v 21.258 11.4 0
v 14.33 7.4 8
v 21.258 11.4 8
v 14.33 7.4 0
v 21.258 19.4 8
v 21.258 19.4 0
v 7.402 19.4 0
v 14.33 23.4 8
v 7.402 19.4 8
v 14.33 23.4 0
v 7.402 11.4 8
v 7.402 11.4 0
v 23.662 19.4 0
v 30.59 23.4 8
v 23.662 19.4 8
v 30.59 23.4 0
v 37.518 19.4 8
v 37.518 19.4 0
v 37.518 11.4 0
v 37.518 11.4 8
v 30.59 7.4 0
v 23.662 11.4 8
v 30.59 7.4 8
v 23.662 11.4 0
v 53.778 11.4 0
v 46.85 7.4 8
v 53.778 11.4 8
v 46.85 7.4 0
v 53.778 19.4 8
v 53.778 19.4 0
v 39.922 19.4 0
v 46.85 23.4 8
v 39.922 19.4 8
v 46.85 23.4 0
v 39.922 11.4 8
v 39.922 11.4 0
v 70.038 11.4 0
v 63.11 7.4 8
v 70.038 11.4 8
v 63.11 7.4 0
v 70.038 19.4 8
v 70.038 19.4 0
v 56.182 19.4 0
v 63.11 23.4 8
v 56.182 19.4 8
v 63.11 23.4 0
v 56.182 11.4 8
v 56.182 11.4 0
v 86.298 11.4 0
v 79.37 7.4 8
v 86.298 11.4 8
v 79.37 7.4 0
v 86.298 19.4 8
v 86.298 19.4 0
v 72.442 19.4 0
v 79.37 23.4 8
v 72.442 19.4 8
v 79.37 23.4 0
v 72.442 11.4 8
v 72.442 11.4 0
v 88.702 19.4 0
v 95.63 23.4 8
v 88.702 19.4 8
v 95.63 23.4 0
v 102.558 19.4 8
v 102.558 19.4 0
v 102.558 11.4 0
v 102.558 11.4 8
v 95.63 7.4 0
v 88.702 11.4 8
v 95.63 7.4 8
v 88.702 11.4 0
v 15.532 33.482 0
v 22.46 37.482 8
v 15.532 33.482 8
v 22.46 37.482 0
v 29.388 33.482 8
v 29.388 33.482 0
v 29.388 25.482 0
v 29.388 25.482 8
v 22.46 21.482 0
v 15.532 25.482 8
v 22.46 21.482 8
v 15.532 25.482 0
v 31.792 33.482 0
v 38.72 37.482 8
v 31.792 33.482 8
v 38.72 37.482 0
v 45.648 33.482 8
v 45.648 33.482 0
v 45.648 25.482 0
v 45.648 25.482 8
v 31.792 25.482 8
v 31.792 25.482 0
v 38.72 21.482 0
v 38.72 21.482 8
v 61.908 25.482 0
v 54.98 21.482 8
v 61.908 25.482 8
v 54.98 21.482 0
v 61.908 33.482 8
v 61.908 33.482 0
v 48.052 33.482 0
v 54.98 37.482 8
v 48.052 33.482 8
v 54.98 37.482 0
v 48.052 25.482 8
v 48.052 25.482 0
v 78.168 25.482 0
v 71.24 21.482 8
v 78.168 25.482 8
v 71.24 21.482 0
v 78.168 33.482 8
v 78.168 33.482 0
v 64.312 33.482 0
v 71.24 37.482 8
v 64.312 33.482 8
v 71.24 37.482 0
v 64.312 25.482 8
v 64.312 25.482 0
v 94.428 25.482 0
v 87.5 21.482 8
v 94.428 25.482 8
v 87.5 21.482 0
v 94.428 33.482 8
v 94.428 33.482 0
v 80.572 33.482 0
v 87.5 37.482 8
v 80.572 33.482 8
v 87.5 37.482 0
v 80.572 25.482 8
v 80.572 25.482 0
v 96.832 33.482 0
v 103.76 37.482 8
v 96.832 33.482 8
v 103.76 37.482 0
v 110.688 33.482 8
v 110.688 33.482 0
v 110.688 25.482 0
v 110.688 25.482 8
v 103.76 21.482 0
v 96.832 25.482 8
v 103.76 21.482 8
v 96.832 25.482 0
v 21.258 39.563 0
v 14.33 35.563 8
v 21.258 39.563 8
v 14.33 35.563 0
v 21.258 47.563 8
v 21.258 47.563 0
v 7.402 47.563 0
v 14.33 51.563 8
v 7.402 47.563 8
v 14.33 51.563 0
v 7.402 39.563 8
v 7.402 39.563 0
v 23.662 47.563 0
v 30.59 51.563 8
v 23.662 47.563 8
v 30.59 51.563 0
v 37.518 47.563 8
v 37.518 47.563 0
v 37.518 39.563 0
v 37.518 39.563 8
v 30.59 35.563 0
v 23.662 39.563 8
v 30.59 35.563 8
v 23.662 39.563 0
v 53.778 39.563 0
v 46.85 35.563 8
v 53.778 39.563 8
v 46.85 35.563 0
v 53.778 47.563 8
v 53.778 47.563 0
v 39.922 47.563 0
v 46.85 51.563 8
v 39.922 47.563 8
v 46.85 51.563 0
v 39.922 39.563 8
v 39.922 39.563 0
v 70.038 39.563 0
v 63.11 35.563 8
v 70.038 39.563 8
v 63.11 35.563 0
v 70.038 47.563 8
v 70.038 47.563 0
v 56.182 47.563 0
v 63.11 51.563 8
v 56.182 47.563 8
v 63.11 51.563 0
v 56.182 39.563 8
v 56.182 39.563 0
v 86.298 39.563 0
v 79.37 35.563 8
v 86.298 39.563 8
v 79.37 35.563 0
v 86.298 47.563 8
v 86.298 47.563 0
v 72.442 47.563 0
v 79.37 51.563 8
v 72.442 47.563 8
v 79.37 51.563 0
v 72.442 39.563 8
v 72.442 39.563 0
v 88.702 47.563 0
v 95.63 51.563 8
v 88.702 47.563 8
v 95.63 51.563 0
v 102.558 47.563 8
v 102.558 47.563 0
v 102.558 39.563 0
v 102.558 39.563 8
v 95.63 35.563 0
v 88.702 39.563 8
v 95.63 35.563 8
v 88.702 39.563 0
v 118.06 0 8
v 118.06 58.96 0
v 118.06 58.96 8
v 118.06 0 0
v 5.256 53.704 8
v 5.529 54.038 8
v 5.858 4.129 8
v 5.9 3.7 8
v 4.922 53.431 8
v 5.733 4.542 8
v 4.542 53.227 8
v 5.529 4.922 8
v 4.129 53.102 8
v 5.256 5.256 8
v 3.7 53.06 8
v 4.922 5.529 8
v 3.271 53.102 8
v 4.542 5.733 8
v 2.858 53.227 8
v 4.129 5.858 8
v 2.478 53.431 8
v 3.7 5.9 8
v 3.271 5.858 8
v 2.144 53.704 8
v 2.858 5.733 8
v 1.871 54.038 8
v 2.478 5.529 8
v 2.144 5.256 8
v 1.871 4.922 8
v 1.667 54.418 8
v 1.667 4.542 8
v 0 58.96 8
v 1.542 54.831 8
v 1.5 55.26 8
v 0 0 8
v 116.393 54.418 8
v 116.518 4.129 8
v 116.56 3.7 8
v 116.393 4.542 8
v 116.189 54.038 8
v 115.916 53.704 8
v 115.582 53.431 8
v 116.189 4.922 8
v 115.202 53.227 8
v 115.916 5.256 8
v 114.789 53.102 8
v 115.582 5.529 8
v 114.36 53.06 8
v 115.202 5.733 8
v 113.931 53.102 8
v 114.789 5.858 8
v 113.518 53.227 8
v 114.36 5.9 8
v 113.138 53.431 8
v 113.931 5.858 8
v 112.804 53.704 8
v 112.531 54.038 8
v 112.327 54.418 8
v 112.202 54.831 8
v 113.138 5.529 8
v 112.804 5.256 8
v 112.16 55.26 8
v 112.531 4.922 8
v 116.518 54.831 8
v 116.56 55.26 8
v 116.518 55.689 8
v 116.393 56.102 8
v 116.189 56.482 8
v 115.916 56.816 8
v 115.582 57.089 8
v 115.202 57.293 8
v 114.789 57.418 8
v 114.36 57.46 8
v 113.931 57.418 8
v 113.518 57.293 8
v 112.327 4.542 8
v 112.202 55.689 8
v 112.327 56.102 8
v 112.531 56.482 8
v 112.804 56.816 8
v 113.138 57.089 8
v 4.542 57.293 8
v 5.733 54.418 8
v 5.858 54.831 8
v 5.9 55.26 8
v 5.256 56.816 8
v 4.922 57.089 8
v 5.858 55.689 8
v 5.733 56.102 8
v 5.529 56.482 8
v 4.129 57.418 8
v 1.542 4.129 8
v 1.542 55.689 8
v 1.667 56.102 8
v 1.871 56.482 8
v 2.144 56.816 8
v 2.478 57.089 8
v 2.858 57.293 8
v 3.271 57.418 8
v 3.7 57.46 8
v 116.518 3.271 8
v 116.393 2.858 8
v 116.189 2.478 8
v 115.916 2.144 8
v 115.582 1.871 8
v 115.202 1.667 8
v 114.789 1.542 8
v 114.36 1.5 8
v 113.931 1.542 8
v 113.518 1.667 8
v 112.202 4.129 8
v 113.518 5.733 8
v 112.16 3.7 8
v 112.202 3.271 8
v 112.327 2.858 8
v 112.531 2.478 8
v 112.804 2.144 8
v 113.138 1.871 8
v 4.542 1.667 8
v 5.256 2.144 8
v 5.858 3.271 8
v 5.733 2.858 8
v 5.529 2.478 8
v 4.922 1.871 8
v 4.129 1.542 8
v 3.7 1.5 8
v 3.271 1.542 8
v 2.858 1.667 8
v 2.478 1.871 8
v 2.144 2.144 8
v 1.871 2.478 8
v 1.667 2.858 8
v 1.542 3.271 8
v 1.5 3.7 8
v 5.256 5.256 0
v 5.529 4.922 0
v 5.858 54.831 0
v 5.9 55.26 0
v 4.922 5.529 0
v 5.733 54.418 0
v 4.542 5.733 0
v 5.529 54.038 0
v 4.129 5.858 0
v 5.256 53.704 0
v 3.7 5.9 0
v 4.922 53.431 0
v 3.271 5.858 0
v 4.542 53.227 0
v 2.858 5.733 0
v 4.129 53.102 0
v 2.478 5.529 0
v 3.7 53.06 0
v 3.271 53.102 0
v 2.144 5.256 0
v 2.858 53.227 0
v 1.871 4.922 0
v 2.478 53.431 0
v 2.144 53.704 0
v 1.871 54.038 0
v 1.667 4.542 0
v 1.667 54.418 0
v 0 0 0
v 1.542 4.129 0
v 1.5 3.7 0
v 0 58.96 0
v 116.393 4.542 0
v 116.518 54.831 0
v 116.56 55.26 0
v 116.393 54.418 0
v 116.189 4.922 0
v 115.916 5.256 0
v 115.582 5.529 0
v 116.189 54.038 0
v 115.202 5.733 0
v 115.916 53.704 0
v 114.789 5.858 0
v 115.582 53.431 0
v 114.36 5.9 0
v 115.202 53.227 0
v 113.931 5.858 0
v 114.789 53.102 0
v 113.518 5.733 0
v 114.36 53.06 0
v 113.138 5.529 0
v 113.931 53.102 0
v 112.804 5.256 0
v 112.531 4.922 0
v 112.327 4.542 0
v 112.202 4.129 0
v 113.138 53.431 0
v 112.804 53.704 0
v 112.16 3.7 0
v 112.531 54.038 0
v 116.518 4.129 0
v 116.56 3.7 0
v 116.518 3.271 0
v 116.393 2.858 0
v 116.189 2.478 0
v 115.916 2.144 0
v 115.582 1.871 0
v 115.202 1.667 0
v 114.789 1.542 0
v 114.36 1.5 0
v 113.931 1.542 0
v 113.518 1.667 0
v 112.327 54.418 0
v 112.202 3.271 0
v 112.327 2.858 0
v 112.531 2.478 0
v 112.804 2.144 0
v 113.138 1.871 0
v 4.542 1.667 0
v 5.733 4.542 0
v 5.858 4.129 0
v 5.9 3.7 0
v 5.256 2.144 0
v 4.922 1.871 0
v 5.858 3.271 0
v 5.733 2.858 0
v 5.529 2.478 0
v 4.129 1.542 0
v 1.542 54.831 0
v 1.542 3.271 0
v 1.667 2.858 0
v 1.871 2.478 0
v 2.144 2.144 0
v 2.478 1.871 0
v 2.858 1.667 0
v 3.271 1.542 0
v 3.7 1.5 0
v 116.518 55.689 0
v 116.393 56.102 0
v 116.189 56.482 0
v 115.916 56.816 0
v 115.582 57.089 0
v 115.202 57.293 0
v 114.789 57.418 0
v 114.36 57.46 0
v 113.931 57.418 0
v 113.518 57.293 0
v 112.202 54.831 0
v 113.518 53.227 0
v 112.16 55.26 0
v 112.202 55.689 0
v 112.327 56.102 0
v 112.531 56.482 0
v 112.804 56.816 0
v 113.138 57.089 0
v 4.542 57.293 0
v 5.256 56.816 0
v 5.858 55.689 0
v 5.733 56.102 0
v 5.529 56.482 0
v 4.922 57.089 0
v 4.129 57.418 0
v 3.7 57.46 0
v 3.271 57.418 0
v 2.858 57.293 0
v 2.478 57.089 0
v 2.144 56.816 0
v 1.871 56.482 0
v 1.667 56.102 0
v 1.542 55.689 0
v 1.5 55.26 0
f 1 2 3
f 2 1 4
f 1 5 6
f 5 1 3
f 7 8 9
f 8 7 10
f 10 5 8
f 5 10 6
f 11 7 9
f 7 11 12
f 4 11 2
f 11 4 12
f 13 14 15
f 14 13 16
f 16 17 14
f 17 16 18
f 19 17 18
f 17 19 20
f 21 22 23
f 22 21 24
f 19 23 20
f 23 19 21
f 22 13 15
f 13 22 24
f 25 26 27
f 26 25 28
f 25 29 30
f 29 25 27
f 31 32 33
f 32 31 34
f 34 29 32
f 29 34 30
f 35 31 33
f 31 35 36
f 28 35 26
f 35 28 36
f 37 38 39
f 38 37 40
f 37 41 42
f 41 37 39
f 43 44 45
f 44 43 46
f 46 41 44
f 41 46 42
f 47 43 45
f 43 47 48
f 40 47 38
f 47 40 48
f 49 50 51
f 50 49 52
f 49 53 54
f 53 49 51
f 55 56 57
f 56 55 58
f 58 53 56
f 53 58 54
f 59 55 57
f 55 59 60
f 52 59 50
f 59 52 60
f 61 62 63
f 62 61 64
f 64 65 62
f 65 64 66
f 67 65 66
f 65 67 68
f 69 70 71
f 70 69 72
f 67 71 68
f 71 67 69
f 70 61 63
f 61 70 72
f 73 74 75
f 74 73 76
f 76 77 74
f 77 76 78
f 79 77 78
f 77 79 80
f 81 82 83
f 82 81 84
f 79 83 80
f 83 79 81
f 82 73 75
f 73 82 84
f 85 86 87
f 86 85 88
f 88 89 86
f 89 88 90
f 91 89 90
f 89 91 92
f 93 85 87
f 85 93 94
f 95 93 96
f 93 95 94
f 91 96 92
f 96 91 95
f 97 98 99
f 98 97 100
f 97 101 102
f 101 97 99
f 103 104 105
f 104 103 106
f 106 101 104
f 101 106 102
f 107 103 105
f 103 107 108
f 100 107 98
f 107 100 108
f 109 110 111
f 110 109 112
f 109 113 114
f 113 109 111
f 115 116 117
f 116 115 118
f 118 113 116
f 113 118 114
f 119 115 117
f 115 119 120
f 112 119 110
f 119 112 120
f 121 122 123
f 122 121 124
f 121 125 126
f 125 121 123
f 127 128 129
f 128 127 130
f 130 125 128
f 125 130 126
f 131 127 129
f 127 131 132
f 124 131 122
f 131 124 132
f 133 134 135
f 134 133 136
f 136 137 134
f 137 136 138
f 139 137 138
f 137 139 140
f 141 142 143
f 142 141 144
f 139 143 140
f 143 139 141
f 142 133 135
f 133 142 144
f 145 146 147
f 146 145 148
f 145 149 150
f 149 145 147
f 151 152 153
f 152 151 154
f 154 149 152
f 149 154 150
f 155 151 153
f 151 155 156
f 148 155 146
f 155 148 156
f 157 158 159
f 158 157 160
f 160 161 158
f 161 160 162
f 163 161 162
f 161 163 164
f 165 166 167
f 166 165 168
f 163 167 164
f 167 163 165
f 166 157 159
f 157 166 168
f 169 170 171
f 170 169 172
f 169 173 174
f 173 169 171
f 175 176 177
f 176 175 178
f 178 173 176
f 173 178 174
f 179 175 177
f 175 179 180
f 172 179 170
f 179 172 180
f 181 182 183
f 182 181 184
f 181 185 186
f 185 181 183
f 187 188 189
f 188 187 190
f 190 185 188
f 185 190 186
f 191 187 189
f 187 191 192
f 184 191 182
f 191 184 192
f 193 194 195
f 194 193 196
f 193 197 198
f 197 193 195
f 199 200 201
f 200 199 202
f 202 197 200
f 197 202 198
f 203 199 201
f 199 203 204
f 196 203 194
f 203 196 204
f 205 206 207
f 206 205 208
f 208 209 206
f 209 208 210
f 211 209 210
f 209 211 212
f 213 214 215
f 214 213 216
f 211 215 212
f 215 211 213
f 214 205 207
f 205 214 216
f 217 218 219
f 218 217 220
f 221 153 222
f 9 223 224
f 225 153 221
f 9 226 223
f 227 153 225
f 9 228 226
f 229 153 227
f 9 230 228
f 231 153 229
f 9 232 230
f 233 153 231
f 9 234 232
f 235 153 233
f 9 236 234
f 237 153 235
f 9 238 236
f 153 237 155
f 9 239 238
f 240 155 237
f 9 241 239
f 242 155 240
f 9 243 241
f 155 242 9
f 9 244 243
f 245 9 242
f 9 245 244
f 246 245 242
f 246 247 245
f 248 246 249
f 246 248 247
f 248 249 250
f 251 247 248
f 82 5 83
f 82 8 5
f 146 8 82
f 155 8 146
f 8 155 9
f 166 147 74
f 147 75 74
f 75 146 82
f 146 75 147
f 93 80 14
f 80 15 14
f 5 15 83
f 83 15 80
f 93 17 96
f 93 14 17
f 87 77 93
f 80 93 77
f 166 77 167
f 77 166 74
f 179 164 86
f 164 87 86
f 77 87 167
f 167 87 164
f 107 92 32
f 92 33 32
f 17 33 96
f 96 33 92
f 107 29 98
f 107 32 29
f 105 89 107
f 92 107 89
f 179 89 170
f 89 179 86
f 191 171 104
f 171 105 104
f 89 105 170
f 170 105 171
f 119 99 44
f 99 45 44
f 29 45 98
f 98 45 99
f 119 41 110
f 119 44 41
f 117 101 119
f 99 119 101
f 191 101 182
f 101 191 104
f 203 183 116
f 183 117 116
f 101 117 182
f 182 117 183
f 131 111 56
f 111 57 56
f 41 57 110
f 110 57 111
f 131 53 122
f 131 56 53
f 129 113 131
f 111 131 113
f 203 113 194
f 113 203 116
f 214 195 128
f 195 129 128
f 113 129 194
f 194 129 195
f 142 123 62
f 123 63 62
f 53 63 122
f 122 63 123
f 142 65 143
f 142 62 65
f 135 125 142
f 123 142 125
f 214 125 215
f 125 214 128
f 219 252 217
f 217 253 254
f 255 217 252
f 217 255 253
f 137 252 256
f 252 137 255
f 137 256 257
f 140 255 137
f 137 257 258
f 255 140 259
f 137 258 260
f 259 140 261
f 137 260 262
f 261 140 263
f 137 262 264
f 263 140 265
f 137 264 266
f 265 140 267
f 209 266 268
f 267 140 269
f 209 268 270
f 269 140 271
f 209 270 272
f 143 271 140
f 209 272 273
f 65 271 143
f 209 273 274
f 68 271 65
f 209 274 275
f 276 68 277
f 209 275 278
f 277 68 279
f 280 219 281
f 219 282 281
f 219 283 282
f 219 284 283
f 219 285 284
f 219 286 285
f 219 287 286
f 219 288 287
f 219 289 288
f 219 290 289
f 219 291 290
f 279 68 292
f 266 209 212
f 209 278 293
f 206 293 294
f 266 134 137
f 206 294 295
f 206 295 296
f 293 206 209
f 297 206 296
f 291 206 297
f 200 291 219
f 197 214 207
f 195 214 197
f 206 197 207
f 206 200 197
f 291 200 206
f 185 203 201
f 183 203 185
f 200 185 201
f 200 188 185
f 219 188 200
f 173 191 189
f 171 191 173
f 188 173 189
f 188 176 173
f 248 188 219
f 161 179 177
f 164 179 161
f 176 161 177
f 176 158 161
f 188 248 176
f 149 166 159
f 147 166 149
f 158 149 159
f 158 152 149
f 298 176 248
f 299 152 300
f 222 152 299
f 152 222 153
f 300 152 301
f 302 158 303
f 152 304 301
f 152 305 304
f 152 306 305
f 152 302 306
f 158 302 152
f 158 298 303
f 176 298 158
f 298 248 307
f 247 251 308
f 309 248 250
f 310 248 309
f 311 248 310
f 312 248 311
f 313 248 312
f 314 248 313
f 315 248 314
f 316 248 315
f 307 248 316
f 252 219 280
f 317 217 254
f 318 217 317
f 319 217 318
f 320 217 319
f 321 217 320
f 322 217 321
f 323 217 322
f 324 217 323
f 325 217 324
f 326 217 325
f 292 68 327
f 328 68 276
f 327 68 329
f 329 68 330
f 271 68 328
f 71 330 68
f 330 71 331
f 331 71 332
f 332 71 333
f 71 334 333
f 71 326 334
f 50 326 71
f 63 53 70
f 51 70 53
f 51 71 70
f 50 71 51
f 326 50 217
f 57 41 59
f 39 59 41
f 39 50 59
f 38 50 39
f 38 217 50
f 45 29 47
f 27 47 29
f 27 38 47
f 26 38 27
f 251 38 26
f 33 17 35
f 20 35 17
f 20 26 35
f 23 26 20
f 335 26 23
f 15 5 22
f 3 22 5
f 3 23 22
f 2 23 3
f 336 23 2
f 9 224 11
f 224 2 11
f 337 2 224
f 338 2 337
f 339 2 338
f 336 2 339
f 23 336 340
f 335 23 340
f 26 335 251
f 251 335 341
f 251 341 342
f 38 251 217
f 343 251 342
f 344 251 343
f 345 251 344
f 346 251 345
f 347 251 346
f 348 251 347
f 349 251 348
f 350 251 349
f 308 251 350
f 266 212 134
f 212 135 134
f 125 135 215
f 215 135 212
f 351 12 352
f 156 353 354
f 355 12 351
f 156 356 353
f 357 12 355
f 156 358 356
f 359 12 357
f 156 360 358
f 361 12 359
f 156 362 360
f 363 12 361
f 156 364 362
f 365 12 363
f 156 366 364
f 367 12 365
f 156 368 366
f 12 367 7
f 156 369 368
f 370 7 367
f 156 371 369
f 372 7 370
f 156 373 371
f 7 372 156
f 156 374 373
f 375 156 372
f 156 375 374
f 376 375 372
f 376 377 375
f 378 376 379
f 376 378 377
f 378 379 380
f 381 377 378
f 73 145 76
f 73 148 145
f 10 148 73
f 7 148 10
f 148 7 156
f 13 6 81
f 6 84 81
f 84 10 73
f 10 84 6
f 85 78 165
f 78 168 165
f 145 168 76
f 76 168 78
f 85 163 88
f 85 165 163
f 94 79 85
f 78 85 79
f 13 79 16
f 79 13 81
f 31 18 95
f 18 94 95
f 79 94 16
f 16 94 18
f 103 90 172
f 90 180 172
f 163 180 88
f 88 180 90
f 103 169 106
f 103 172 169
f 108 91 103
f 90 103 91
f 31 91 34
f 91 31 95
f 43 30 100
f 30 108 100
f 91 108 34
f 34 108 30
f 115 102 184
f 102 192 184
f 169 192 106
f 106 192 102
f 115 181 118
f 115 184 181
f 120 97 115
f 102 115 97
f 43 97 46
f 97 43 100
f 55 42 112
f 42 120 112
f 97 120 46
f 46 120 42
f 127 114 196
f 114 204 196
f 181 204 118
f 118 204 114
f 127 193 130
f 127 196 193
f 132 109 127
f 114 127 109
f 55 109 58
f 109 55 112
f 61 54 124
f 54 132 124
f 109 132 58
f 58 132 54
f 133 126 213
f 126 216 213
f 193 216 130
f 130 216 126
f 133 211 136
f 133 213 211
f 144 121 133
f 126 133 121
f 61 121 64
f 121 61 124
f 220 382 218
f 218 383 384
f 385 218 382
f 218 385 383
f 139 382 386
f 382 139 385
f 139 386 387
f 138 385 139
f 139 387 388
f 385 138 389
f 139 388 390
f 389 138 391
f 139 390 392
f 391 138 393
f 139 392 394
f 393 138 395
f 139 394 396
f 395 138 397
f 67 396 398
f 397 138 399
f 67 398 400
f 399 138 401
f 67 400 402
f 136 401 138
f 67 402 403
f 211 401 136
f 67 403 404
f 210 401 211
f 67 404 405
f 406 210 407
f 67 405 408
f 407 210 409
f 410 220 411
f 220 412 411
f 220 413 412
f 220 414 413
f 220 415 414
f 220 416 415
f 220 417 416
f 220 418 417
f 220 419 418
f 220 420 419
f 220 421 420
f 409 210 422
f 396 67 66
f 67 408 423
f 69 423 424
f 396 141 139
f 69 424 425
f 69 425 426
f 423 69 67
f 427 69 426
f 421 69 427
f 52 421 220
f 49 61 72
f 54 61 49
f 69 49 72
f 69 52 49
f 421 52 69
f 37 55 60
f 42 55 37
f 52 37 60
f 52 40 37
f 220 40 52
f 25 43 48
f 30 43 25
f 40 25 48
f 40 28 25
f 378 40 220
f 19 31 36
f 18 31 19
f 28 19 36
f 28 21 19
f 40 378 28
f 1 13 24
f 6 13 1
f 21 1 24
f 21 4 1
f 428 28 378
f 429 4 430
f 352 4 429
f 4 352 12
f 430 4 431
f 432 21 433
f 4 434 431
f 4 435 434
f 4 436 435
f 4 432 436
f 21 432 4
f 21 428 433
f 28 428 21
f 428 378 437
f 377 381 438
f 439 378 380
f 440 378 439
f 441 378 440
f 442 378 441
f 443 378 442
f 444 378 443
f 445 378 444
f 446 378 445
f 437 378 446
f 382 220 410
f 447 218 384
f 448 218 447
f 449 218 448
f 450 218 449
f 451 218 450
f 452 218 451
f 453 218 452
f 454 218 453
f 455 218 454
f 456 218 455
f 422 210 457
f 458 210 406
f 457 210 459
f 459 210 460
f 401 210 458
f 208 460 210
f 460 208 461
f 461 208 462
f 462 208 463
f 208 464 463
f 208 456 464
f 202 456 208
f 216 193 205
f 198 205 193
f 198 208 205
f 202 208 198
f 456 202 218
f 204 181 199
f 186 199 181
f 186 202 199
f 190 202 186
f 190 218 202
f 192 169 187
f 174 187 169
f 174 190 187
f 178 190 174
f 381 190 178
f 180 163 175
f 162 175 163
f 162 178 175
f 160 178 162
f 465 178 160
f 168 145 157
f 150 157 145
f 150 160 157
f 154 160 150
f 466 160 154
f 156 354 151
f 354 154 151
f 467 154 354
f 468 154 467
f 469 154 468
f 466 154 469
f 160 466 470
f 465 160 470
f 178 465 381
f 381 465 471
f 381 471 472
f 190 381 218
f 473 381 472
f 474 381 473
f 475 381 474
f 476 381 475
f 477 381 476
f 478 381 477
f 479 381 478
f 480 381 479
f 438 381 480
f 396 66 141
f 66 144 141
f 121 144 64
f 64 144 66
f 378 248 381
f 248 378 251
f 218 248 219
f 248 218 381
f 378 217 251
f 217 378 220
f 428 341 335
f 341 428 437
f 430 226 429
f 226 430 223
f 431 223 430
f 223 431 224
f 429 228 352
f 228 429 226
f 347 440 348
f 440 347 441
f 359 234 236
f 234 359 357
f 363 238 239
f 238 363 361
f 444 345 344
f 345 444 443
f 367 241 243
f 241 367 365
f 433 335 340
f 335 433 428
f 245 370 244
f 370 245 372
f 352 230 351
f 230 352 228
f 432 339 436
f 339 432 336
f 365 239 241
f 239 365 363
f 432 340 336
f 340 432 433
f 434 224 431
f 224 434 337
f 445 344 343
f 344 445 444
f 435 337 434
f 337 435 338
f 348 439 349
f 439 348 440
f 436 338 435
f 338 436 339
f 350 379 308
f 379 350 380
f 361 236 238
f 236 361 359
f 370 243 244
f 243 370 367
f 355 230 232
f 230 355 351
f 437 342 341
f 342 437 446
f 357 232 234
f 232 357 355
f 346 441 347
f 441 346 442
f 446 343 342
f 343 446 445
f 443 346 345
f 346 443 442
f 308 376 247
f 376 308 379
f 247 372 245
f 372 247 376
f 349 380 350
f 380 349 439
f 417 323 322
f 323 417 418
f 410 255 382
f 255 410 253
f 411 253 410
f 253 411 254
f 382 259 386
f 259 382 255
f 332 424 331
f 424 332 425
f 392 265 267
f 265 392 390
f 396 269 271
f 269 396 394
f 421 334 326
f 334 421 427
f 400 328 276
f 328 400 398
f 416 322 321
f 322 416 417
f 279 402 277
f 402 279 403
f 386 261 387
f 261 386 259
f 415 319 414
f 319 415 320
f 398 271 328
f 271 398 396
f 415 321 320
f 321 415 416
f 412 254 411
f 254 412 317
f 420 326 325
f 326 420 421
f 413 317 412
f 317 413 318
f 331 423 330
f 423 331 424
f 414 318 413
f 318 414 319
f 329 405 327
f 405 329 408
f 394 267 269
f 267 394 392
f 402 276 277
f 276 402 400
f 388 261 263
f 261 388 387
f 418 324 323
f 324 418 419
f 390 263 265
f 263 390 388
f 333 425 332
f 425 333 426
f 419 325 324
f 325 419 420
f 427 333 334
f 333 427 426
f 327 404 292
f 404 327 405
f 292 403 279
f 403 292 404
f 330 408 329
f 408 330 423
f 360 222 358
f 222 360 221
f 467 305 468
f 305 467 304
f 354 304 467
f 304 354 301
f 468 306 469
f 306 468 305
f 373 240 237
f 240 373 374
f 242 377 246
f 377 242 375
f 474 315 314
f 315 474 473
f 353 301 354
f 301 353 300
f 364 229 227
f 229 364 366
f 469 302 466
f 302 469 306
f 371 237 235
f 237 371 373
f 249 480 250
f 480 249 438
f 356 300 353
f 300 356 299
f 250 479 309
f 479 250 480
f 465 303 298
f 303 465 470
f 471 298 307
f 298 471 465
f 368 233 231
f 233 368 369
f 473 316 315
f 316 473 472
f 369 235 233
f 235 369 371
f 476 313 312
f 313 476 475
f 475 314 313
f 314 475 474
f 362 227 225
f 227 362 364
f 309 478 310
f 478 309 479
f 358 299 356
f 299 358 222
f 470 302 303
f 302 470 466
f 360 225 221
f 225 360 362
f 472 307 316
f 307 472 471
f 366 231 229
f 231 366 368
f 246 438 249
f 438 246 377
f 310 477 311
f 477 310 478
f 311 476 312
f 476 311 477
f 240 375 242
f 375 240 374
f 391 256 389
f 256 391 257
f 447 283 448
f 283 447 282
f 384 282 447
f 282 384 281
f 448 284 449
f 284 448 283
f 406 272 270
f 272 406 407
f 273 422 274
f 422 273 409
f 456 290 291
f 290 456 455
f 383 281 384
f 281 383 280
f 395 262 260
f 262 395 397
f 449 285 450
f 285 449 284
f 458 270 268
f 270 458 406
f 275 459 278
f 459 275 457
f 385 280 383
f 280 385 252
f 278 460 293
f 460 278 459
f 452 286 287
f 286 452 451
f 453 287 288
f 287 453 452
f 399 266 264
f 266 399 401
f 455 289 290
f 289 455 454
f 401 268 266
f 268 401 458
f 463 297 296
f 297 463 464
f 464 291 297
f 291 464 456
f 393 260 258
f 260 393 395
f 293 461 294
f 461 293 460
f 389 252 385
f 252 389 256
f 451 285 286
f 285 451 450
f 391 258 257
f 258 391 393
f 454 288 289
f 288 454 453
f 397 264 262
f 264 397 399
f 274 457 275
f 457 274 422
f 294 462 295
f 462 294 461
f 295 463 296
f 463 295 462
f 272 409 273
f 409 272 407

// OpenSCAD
$fn = 32;

// ----------------------------------------------------------------------
// Honeycomb panel: 118.06 x 58.96 mm, 18 cells of 16 mm
// ----------------------------------------------------------------------

// --- parameters (mm) ---
panel_w = 118.06;         // panel width
panel_d = 58.96;          // panel depth
thick = 8;                // panel thickness
cell_r = 8;               // hex cell circumradius
pitch = 16.26;            // hex cell pitch (centre to centre)
web = 2.4;                // web between the cells
columns = 6;              // columns of cells
rows = 3;                 // rows of cells
cell_count = 18;          // total cells
shift_x = 14.33;          // first cell offset in x
shift_y = 15.4;           // first cell offset in y
mount_d = 4.4;            // corner mounting holes
hole_off = 3.7;           // mounting hole offset from the corners

difference() {
  union() {
    cube([panel_w, panel_d, thick]);
  }
  /* hexagonal cells, point-up, cut right through the plate */
  for (row = [0 : rows - 1]) {
    for (col = [0 : columns - 1]) {
      translate([shift_x + col * pitch + (row % 2) * pitch / 2, shift_y + row * pitch * 0.866025, -2.5]) rotate([0, 0, 30]) cylinder(h = thick + 5, d = 2 * cell_r, $fn = 6);
    }
  }
  /* corner mounting holes, clear of the outer cell web */
  translate([3.7, 3.7, -2.5]) cylinder(h = thick + 5, d = mount_d);
  translate([114.36, 3.7, -2.5]) cylinder(h = thick + 5, d = mount_d);
  translate([3.7, 55.26, -2.5]) cylinder(h = thick + 5, d = mount_d);
  translate([114.36, 55.26, -2.5]) cylinder(h = thick + 5, d = mount_d);
}
